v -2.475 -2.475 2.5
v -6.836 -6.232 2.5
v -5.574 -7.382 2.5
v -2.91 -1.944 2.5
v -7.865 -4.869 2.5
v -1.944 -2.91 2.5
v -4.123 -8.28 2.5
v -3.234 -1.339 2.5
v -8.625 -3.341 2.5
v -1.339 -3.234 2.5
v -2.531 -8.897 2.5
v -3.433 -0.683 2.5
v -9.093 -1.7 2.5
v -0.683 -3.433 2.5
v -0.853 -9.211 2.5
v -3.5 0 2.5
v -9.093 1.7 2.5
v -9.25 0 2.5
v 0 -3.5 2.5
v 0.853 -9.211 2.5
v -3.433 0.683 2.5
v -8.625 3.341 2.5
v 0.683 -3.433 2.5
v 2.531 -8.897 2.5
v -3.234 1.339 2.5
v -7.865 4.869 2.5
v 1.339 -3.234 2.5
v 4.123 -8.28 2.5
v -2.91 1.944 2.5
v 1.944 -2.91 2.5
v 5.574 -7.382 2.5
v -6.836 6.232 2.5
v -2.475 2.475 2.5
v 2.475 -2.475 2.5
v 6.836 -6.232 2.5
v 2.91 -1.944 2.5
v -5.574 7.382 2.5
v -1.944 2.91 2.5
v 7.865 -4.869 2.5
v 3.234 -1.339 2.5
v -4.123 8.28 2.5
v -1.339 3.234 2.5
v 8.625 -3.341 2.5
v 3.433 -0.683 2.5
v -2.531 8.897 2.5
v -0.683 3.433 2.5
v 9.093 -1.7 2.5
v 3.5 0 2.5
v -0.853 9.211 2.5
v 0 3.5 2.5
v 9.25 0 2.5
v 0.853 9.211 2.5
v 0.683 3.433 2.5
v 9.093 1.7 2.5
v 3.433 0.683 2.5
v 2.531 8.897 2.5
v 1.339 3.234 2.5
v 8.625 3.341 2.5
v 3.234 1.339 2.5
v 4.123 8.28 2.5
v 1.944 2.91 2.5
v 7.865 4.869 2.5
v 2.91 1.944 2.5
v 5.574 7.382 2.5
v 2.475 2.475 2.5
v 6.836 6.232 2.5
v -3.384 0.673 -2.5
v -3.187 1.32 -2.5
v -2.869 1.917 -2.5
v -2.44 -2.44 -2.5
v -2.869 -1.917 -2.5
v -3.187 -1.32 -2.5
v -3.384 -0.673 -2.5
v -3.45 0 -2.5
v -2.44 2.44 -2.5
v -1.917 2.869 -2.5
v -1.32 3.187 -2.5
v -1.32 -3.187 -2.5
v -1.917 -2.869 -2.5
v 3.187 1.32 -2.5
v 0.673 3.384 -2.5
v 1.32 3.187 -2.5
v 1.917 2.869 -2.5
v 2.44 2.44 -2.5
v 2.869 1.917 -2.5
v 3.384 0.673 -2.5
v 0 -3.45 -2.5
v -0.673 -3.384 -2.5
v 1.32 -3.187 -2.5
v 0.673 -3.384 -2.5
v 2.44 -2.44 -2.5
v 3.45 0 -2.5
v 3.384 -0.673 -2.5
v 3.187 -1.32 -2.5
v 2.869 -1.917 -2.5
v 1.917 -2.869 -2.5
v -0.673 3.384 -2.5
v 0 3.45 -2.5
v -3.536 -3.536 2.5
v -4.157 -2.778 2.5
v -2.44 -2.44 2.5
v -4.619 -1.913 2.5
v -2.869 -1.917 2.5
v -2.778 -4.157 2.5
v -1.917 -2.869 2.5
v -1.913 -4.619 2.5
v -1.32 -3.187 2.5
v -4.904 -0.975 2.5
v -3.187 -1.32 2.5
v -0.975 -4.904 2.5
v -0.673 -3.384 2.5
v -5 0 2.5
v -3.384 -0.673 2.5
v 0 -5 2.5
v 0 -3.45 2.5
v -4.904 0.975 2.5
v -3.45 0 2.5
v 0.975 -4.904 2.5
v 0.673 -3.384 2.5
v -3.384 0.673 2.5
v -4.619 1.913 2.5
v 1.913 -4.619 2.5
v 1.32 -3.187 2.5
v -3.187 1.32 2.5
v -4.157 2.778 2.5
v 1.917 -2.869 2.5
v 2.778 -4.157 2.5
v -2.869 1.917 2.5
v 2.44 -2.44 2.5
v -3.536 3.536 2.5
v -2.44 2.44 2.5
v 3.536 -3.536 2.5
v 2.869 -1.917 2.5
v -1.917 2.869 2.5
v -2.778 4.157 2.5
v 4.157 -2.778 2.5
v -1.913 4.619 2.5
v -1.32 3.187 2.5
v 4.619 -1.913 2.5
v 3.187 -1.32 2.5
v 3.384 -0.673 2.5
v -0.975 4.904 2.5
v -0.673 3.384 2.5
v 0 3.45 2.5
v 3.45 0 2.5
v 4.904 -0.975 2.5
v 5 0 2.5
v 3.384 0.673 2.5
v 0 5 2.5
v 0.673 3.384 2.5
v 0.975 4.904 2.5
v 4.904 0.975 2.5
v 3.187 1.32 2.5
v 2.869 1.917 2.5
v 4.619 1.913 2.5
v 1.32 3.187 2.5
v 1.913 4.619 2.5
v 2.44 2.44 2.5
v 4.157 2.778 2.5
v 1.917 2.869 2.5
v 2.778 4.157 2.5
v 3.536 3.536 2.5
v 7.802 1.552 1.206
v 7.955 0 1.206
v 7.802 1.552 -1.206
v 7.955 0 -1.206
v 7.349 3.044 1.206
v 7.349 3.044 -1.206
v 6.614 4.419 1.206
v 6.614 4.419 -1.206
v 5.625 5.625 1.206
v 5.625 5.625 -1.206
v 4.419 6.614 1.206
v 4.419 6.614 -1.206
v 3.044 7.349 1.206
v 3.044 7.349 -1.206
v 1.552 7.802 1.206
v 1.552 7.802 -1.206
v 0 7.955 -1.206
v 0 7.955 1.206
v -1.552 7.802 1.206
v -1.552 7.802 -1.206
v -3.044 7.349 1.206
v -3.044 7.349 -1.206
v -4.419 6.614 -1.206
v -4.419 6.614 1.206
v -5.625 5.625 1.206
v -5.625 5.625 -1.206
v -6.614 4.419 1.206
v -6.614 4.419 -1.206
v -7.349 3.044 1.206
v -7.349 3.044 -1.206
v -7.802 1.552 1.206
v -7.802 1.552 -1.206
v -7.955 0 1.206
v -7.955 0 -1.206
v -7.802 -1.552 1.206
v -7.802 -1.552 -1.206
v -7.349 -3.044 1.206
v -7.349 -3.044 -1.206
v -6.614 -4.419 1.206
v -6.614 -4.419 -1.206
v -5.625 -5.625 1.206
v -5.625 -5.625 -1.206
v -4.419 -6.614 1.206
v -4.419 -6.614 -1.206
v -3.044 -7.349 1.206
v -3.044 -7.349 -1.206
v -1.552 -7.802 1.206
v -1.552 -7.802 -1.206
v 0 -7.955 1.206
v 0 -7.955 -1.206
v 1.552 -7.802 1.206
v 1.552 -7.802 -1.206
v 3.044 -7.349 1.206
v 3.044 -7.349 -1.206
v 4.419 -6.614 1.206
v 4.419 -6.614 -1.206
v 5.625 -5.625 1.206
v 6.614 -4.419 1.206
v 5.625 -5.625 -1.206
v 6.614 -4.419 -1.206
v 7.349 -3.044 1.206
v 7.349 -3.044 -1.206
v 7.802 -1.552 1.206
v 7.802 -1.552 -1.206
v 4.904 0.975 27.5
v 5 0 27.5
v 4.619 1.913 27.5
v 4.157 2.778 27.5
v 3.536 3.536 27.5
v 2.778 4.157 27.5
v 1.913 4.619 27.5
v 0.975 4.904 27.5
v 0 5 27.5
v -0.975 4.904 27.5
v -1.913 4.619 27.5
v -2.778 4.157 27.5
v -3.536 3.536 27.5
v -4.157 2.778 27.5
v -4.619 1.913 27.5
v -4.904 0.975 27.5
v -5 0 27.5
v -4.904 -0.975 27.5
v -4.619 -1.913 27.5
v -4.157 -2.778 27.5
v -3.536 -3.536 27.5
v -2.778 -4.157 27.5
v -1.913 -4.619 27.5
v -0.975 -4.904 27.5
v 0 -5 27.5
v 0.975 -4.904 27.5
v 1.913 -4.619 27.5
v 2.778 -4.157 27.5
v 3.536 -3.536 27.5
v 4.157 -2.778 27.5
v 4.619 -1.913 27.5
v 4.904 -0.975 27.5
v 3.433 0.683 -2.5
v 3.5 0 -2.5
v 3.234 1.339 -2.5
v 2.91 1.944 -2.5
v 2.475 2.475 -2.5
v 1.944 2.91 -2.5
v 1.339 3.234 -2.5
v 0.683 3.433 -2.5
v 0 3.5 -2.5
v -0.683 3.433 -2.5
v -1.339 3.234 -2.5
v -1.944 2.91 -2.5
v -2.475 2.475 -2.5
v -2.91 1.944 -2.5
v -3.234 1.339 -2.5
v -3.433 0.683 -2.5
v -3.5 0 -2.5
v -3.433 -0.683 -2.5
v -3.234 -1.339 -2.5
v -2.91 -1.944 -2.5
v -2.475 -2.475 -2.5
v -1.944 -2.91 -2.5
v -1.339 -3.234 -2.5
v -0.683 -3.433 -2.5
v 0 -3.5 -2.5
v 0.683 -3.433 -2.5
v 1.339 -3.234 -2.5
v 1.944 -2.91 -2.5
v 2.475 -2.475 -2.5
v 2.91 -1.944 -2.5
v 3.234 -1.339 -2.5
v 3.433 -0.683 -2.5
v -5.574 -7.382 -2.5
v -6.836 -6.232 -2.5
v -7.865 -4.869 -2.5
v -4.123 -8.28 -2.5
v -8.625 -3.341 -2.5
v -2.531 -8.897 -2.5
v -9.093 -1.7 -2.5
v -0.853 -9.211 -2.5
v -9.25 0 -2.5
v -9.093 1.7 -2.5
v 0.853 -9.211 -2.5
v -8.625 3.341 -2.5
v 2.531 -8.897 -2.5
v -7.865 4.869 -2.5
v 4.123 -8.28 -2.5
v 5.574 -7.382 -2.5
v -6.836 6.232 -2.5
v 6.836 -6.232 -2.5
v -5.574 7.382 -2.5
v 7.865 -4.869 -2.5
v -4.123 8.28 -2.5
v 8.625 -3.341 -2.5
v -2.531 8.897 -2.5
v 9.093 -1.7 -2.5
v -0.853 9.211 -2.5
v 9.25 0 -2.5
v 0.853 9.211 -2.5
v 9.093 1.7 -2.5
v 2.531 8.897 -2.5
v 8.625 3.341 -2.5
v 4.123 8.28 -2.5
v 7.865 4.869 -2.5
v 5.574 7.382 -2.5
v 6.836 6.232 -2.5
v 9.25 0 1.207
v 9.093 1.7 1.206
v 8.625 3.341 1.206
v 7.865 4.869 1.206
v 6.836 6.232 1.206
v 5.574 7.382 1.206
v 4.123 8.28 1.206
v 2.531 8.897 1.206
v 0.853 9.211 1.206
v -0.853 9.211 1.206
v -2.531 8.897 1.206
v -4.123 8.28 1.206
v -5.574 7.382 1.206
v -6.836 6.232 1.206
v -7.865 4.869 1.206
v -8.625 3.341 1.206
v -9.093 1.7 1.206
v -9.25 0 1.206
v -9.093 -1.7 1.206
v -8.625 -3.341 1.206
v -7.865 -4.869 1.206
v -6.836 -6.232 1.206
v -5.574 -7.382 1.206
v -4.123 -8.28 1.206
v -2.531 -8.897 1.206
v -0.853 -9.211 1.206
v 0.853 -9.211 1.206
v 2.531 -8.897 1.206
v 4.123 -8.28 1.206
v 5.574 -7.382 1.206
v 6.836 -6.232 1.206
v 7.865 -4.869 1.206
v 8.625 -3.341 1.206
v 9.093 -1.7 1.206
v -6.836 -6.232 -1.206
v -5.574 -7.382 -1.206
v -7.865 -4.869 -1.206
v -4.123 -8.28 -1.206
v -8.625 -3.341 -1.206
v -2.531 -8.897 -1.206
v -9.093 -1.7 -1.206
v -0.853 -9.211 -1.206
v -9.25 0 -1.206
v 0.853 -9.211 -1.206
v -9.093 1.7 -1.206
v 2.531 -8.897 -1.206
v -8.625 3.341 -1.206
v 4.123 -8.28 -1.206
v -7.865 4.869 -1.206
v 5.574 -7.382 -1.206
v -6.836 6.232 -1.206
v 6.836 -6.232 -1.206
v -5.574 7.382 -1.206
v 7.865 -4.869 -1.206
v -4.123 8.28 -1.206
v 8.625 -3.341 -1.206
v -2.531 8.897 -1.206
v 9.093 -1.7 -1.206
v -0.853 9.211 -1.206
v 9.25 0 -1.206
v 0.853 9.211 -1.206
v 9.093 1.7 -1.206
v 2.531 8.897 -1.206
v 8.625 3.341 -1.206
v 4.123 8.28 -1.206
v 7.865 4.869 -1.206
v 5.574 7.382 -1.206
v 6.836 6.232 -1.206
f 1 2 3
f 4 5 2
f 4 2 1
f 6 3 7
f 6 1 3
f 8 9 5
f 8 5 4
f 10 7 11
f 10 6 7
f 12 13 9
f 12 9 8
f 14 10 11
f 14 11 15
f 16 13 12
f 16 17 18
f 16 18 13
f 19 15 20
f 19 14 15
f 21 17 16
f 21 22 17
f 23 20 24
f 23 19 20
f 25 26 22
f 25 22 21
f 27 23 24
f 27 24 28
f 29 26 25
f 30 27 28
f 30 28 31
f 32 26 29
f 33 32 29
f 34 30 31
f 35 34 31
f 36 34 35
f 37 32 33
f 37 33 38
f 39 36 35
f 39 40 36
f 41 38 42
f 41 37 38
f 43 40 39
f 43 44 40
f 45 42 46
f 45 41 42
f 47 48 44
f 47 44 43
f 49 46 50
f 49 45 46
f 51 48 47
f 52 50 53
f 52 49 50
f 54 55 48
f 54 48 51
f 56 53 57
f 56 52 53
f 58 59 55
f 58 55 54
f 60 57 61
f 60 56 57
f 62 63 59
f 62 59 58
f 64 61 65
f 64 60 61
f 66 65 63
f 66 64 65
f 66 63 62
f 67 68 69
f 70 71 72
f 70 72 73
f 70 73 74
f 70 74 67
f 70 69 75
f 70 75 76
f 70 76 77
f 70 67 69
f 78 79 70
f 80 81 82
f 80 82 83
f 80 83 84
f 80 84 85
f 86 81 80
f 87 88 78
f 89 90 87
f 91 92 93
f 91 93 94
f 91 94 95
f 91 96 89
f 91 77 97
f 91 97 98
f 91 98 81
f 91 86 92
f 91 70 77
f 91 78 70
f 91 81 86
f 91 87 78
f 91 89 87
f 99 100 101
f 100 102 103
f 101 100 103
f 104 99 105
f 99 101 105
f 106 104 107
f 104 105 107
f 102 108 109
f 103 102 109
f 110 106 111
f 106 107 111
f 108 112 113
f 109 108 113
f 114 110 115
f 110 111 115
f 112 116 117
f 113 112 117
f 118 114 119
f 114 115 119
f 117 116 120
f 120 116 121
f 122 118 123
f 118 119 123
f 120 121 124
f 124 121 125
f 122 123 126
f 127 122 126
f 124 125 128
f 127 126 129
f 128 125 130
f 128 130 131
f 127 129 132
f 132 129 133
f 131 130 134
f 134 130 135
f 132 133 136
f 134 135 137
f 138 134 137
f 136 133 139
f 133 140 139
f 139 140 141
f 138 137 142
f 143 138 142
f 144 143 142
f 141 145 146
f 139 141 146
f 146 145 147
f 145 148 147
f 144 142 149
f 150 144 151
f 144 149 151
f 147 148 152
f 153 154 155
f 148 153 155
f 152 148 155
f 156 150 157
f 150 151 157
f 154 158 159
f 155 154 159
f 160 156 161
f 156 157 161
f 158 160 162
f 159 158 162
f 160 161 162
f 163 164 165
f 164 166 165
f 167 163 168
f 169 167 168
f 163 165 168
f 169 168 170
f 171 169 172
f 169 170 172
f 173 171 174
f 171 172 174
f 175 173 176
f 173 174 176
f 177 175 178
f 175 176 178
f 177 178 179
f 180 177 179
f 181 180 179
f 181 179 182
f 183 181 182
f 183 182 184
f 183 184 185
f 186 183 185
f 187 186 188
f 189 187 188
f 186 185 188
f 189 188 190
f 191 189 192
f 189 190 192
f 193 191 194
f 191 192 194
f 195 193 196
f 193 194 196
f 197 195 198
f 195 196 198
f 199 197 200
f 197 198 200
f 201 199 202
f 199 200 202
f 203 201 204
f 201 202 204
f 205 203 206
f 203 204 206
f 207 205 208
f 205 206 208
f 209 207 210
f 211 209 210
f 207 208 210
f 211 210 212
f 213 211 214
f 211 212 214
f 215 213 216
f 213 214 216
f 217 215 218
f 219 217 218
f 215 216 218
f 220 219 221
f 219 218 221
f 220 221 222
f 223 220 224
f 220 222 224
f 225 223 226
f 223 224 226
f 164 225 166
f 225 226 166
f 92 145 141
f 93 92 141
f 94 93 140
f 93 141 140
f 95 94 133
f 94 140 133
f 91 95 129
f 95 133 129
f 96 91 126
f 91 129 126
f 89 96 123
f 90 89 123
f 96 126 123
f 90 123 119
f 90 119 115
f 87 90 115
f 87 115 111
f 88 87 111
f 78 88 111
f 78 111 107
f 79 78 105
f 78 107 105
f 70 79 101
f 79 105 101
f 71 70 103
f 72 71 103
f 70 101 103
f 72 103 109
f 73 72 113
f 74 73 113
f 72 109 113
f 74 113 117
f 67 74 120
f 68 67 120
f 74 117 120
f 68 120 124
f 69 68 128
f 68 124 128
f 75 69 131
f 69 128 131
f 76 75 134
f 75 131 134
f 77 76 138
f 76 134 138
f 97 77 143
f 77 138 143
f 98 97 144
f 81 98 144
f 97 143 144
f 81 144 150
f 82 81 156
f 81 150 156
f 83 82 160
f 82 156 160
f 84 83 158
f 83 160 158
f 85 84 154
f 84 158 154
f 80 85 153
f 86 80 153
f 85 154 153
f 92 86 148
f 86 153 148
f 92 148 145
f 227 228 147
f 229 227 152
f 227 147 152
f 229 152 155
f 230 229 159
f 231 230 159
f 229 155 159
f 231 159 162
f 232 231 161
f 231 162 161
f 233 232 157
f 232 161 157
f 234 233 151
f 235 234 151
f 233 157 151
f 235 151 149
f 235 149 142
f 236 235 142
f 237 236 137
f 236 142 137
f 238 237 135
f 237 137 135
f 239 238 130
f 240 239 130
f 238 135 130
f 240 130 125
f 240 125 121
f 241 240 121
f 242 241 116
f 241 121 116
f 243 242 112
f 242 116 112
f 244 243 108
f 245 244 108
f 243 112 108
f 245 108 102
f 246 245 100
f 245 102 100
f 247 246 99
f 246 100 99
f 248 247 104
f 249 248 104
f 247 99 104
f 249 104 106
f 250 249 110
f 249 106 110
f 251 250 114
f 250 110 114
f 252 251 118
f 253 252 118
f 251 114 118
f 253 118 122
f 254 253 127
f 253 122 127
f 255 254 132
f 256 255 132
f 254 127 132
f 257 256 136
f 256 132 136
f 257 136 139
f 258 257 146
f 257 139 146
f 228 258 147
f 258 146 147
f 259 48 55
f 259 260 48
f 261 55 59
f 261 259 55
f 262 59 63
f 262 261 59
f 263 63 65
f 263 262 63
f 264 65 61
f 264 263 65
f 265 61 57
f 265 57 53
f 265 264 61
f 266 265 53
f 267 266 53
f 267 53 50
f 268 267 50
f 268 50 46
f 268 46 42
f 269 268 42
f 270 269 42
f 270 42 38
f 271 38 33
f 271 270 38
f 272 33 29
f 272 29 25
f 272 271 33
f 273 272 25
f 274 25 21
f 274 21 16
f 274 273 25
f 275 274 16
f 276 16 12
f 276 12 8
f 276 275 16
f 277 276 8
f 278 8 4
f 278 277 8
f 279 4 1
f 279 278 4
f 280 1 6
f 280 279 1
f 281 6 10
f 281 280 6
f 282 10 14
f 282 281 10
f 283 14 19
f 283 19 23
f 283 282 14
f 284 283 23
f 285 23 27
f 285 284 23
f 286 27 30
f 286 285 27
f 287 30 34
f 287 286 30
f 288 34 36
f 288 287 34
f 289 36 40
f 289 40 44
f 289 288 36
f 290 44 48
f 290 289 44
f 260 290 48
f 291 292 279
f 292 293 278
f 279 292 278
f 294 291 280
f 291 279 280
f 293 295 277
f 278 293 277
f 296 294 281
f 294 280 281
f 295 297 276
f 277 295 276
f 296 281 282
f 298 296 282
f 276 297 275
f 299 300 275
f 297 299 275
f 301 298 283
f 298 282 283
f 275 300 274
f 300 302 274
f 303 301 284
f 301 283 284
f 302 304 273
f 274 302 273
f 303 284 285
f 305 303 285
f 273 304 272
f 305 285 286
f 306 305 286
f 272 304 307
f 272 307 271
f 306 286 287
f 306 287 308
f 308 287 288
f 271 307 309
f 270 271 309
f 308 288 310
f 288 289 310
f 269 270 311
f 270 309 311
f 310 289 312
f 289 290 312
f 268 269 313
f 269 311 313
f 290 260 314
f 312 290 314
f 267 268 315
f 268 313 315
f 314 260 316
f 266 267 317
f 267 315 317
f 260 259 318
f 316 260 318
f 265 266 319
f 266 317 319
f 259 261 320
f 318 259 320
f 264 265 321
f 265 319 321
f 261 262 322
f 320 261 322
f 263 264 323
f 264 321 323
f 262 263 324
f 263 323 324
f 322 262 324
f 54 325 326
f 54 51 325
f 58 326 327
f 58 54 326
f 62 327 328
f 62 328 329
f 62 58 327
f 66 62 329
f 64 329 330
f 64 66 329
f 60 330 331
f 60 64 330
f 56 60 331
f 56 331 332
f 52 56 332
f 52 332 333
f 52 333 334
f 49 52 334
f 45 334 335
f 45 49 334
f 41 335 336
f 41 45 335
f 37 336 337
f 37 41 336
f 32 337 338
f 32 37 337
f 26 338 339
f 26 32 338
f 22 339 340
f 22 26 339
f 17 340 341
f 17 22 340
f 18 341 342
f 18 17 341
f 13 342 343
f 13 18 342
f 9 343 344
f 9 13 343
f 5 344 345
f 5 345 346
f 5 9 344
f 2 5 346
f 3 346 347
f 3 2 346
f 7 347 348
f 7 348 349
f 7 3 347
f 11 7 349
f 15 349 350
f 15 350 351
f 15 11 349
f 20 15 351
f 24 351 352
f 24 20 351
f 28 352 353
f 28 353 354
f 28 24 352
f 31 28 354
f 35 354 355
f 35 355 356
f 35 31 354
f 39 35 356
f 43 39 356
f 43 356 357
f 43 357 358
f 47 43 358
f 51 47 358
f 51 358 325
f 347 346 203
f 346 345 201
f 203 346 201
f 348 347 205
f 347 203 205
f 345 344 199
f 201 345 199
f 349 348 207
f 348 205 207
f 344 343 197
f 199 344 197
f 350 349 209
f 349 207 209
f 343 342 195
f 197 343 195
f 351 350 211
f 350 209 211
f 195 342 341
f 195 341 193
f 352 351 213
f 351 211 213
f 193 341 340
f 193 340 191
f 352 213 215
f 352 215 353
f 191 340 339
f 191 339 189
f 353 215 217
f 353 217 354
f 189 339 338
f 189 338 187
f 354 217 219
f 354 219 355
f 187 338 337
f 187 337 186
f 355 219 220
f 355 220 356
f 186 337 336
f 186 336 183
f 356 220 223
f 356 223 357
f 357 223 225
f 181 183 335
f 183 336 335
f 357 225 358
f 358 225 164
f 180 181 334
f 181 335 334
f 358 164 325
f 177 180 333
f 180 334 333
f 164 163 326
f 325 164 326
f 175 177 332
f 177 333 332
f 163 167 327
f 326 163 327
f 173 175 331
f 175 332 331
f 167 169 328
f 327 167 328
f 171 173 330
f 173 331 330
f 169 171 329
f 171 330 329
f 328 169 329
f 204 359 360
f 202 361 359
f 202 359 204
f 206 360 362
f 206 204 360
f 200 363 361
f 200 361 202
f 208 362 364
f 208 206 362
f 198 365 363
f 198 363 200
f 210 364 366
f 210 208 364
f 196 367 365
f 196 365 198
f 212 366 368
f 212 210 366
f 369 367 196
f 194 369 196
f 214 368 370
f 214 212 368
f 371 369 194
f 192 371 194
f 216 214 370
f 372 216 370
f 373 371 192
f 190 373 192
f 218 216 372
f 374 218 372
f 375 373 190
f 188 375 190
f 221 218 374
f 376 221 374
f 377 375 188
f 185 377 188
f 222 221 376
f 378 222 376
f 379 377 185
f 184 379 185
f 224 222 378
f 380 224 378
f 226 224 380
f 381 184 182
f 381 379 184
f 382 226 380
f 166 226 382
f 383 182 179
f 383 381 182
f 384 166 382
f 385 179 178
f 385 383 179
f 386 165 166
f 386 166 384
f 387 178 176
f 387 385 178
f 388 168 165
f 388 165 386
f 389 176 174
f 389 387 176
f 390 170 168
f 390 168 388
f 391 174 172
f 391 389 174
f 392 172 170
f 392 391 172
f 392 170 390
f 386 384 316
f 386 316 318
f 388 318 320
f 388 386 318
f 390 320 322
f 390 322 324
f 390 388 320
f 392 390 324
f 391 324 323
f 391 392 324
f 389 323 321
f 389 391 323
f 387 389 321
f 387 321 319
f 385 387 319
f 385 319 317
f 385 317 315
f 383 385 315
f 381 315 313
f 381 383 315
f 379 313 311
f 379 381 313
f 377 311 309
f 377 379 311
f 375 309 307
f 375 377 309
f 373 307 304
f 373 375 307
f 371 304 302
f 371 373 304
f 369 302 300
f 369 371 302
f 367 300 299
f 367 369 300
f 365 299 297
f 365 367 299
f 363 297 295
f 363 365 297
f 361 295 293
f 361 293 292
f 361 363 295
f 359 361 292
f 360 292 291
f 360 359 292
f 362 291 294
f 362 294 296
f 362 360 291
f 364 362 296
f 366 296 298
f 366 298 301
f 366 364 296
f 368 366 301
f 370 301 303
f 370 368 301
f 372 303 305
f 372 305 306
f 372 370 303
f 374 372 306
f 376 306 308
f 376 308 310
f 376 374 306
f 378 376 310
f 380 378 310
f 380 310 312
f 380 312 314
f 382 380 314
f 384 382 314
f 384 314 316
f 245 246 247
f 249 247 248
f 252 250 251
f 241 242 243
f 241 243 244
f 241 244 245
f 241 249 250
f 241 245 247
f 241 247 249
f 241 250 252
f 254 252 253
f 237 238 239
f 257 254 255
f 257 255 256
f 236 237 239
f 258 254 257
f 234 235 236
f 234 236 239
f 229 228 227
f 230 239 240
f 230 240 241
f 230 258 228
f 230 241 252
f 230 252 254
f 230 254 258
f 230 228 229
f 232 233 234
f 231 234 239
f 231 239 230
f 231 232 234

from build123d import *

# Parameters (mm, degrees)
F0_R     = 9.25
F0_R_2   = 3.5
F1_DEPTH = 2.5
F2_R     = 22.5
F2_R_2   = 7.9546
F3_DEPTH = 1.2065
F4_R     = 5
F5_DEPTH = 25
F6_R     = 3.45
F7_DEPTH = 5


with BuildPart() as f1:
    # F0 (on Top) → F1 (new body, symmetric)
    with BuildSketch(Plane.XY):
        Circle(F0_R)
        Circle(F0_R_2, mode=Mode.SUBTRACT)
    extrude(amount=F1_DEPTH, both=True)

    # F2 (on Top) → F3 (cut, symmetric)
    with BuildSketch(Plane.XY):
        Circle(F2_R)
        Circle(F2_R_2, mode=Mode.SUBTRACT)
    extrude(amount=F3_DEPTH, both=True, mode=Mode.SUBTRACT)


with BuildPart() as f5:
    # F4 (on face) → F5 (new body)
    with BuildSketch(Plane.XY.offset(2.5)):
        Circle(F4_R)
    extrude(amount=F5_DEPTH)

    # F6 (on face) → F7 (join, through all)
    with BuildSketch(Plane(origin=(0, 0, 2.5), x_dir=(1, 0, 0), z_dir=(0, 0, -1))):
        Circle(F6_R)
    extrude(amount=F7_DEPTH)


solid = Compound([f1.part, f5.part])
